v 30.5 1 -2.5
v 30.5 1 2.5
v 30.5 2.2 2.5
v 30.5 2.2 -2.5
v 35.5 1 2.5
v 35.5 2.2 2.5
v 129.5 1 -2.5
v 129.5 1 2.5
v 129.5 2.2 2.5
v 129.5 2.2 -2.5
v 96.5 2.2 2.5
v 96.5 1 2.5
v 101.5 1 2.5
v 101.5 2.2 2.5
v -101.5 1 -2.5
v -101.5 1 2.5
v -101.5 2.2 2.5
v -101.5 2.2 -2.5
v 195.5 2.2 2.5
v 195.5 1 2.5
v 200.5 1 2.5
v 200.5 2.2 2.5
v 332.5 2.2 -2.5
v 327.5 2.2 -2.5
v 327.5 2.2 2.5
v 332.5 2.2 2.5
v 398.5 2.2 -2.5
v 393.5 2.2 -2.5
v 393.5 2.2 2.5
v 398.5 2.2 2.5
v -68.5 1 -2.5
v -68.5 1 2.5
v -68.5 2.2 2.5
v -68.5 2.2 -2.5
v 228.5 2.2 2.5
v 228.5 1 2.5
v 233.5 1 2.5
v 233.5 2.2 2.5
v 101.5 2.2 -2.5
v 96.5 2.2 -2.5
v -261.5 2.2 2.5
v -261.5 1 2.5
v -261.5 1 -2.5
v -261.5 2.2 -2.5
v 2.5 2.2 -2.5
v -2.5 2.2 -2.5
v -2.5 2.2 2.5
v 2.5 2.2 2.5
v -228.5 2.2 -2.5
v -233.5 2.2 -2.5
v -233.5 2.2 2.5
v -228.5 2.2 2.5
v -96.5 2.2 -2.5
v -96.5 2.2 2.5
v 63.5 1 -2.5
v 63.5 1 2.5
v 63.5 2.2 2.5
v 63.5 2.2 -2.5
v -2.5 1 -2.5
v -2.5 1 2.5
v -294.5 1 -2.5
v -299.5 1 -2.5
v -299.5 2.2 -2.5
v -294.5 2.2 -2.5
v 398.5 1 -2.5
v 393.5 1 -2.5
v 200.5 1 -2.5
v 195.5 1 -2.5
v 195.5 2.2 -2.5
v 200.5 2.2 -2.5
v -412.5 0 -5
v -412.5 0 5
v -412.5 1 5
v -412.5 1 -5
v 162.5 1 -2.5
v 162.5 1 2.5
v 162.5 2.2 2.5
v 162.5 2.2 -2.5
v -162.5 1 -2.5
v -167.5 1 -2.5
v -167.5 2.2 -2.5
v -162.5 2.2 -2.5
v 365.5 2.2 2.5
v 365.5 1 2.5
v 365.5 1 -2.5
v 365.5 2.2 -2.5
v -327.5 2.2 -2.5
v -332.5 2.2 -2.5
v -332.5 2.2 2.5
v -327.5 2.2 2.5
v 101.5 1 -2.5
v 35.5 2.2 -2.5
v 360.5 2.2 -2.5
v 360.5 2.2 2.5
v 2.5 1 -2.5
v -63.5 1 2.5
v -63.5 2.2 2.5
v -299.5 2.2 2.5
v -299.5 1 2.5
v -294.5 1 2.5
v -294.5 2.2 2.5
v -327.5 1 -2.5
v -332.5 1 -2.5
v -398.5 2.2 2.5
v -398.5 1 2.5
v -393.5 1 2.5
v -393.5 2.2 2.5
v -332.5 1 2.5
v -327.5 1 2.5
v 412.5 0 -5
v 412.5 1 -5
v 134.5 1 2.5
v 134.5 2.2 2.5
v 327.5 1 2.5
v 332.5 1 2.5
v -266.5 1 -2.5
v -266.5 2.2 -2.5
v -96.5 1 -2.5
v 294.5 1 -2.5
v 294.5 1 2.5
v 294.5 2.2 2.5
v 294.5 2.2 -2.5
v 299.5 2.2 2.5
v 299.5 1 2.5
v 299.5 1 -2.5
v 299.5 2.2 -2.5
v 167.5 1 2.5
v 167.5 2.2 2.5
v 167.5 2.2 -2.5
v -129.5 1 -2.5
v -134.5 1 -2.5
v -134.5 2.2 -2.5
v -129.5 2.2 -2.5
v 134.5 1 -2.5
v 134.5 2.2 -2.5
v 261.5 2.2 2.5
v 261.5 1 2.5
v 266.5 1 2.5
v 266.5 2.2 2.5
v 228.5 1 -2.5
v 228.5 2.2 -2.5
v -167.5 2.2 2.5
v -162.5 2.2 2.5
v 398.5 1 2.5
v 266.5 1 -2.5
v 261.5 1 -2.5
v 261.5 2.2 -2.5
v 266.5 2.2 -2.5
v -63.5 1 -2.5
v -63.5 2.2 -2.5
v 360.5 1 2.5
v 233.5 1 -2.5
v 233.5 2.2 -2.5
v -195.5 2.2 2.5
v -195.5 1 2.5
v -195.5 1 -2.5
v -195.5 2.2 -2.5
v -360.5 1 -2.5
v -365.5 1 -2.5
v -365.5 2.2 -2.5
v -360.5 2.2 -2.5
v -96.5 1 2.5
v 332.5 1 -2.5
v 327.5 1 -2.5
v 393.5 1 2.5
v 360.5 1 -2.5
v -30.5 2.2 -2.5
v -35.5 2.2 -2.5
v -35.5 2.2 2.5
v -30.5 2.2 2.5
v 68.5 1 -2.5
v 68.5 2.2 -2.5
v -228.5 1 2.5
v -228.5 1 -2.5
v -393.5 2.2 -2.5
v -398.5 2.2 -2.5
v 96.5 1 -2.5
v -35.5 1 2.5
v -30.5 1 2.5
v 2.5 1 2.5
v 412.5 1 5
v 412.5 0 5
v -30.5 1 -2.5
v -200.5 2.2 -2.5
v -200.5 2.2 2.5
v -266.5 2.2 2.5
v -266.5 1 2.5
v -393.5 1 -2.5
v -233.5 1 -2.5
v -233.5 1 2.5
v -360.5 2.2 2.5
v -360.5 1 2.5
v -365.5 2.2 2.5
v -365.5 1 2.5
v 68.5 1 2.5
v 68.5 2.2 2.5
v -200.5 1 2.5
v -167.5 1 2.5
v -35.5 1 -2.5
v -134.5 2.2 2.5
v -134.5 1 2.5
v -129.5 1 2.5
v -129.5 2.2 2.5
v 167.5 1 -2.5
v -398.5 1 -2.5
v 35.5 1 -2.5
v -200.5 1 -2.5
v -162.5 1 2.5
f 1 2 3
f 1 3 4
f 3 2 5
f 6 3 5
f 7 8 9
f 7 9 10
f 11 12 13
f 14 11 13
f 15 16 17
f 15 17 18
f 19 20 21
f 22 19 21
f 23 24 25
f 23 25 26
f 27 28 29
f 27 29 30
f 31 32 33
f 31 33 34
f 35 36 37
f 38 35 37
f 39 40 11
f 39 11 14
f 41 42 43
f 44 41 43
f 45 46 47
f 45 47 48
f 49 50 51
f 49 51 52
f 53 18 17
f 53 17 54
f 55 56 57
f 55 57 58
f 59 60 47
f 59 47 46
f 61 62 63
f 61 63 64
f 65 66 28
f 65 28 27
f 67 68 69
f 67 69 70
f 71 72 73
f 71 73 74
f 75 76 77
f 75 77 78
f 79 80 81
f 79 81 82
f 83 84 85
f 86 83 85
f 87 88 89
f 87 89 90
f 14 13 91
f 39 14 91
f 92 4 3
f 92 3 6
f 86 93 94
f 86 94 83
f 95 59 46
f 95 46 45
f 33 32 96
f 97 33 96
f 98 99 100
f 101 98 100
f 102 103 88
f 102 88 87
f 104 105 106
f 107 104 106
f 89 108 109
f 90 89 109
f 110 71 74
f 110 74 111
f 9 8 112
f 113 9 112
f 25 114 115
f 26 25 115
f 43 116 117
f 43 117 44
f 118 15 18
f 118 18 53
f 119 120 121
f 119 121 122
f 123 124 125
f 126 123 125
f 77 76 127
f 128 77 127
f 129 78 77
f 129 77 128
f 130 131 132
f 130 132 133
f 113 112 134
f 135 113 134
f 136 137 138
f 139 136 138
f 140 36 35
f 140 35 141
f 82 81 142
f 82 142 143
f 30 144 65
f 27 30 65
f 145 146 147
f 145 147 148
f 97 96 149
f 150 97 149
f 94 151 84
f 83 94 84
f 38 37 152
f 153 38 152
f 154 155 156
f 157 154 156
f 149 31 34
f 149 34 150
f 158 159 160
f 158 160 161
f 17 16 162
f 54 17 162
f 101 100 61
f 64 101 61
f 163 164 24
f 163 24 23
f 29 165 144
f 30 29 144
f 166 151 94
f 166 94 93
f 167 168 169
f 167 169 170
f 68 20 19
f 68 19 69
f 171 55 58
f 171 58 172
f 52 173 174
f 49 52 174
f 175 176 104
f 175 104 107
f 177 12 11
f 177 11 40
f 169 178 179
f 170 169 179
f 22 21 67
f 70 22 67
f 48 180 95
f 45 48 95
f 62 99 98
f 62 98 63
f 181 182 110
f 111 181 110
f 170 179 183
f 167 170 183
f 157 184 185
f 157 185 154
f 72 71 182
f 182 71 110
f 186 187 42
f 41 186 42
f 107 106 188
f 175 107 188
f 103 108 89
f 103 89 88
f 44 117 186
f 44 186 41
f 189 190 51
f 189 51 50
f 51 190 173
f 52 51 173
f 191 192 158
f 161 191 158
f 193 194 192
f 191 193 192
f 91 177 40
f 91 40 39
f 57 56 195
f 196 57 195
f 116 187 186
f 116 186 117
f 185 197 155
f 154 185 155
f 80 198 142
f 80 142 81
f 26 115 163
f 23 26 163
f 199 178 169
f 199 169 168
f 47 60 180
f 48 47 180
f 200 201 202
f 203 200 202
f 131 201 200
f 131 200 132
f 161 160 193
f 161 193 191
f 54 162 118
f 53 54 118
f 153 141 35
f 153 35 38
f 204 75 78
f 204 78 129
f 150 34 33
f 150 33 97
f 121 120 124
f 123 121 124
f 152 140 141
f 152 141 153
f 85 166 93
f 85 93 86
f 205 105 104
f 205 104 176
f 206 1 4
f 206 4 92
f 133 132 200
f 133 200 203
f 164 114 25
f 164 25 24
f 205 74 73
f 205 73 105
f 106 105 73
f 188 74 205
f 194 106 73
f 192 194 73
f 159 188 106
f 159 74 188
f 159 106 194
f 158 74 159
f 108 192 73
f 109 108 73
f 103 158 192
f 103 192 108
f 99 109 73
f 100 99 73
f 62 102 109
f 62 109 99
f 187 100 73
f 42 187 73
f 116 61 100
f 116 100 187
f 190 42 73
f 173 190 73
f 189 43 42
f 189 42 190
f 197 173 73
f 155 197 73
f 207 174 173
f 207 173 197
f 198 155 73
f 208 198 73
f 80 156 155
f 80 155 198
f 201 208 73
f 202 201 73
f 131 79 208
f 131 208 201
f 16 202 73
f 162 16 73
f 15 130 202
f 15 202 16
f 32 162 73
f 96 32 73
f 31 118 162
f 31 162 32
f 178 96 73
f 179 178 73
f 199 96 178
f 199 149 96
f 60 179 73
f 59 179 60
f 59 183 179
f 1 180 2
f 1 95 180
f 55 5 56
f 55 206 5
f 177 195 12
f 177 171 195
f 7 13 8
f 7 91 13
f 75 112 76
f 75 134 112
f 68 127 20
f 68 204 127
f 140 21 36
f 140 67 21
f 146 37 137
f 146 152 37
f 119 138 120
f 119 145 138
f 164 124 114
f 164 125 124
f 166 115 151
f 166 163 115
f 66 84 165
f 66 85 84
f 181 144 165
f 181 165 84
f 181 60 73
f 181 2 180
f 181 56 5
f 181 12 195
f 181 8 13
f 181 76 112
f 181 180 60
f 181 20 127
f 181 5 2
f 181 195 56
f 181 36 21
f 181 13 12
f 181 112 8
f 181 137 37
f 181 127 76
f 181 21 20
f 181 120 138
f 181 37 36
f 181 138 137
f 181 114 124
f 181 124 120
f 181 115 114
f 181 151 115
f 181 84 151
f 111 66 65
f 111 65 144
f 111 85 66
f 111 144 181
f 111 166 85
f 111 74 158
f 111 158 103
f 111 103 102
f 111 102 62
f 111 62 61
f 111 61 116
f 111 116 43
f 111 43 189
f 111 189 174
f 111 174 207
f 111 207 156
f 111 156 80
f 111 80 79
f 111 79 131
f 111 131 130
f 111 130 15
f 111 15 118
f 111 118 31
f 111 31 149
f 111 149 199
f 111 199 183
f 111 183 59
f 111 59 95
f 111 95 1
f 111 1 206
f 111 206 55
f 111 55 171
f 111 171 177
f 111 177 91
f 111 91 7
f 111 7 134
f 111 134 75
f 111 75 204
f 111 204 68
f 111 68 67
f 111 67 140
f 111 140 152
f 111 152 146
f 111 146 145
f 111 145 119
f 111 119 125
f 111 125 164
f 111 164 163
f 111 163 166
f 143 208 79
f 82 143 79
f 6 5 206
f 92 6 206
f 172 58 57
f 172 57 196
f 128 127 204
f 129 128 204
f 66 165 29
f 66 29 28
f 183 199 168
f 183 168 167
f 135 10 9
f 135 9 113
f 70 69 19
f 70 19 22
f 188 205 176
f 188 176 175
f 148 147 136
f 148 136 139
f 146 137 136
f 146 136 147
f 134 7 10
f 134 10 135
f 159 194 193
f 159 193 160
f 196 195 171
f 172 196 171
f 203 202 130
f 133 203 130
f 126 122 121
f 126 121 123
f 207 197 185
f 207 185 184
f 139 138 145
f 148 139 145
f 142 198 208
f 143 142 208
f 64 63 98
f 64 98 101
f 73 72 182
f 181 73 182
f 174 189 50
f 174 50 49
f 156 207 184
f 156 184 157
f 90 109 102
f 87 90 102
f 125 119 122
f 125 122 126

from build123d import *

# Parameters (mm, degrees)
SKETCH1_W           = 33
SKETCH1_H           = 10
BOSS_EXTRUDE1_DEPTH = 1
SKETCH3_W           = 5
SKETCH3_H           = 5
BOSS_EXTRUDE2_DEPTH = 1.2
LPATTERN1_COUNT     = 13
LPATTERN1_PITCH     = 33
LPATTERN1_COL_COUNT = 13
LPATTERN1_COL_PITCH = 33


with BuildPart() as part:
    # Sketch1 → Boss-Extrude1 (new body)
    with BuildSketch(Plane(origin=(0, 0, 0), x_dir=(1, 0, 0), z_dir=(0, 1, 0))):
        Rectangle(SKETCH1_W, SKETCH1_H)
    boss_extrude1 = extrude(amount=BOSS_EXTRUDE1_DEPTH)

    # Sketch3 → Boss-Extrude2 (add)
    with BuildSketch(Plane(origin=(0, 1, 0), x_dir=(1, 0, 0), z_dir=(0, 1, 0))):
        Rectangle(SKETCH3_W, SKETCH3_H)
    boss_extrude2 = extrude(amount=BOSS_EXTRUDE2_DEPTH)

    # LPattern1: Boss-Extrude1, Boss-Extrude2 ×13
    with Locations(*[(-i * LPATTERN1_PITCH, 0, 0) for i in range(1, LPATTERN1_COUNT)]):
        add(boss_extrude1)
        add(boss_extrude2)

    # LPattern1 col: Boss-Extrude1, Boss-Extrude2 ×13
    with Locations(*[(i * LPATTERN1_COL_PITCH, 0, 0) for i in range(1, LPATTERN1_COL_COUNT)]):
        add(boss_extrude1)
        add(boss_extrude2)


solid = part.part
